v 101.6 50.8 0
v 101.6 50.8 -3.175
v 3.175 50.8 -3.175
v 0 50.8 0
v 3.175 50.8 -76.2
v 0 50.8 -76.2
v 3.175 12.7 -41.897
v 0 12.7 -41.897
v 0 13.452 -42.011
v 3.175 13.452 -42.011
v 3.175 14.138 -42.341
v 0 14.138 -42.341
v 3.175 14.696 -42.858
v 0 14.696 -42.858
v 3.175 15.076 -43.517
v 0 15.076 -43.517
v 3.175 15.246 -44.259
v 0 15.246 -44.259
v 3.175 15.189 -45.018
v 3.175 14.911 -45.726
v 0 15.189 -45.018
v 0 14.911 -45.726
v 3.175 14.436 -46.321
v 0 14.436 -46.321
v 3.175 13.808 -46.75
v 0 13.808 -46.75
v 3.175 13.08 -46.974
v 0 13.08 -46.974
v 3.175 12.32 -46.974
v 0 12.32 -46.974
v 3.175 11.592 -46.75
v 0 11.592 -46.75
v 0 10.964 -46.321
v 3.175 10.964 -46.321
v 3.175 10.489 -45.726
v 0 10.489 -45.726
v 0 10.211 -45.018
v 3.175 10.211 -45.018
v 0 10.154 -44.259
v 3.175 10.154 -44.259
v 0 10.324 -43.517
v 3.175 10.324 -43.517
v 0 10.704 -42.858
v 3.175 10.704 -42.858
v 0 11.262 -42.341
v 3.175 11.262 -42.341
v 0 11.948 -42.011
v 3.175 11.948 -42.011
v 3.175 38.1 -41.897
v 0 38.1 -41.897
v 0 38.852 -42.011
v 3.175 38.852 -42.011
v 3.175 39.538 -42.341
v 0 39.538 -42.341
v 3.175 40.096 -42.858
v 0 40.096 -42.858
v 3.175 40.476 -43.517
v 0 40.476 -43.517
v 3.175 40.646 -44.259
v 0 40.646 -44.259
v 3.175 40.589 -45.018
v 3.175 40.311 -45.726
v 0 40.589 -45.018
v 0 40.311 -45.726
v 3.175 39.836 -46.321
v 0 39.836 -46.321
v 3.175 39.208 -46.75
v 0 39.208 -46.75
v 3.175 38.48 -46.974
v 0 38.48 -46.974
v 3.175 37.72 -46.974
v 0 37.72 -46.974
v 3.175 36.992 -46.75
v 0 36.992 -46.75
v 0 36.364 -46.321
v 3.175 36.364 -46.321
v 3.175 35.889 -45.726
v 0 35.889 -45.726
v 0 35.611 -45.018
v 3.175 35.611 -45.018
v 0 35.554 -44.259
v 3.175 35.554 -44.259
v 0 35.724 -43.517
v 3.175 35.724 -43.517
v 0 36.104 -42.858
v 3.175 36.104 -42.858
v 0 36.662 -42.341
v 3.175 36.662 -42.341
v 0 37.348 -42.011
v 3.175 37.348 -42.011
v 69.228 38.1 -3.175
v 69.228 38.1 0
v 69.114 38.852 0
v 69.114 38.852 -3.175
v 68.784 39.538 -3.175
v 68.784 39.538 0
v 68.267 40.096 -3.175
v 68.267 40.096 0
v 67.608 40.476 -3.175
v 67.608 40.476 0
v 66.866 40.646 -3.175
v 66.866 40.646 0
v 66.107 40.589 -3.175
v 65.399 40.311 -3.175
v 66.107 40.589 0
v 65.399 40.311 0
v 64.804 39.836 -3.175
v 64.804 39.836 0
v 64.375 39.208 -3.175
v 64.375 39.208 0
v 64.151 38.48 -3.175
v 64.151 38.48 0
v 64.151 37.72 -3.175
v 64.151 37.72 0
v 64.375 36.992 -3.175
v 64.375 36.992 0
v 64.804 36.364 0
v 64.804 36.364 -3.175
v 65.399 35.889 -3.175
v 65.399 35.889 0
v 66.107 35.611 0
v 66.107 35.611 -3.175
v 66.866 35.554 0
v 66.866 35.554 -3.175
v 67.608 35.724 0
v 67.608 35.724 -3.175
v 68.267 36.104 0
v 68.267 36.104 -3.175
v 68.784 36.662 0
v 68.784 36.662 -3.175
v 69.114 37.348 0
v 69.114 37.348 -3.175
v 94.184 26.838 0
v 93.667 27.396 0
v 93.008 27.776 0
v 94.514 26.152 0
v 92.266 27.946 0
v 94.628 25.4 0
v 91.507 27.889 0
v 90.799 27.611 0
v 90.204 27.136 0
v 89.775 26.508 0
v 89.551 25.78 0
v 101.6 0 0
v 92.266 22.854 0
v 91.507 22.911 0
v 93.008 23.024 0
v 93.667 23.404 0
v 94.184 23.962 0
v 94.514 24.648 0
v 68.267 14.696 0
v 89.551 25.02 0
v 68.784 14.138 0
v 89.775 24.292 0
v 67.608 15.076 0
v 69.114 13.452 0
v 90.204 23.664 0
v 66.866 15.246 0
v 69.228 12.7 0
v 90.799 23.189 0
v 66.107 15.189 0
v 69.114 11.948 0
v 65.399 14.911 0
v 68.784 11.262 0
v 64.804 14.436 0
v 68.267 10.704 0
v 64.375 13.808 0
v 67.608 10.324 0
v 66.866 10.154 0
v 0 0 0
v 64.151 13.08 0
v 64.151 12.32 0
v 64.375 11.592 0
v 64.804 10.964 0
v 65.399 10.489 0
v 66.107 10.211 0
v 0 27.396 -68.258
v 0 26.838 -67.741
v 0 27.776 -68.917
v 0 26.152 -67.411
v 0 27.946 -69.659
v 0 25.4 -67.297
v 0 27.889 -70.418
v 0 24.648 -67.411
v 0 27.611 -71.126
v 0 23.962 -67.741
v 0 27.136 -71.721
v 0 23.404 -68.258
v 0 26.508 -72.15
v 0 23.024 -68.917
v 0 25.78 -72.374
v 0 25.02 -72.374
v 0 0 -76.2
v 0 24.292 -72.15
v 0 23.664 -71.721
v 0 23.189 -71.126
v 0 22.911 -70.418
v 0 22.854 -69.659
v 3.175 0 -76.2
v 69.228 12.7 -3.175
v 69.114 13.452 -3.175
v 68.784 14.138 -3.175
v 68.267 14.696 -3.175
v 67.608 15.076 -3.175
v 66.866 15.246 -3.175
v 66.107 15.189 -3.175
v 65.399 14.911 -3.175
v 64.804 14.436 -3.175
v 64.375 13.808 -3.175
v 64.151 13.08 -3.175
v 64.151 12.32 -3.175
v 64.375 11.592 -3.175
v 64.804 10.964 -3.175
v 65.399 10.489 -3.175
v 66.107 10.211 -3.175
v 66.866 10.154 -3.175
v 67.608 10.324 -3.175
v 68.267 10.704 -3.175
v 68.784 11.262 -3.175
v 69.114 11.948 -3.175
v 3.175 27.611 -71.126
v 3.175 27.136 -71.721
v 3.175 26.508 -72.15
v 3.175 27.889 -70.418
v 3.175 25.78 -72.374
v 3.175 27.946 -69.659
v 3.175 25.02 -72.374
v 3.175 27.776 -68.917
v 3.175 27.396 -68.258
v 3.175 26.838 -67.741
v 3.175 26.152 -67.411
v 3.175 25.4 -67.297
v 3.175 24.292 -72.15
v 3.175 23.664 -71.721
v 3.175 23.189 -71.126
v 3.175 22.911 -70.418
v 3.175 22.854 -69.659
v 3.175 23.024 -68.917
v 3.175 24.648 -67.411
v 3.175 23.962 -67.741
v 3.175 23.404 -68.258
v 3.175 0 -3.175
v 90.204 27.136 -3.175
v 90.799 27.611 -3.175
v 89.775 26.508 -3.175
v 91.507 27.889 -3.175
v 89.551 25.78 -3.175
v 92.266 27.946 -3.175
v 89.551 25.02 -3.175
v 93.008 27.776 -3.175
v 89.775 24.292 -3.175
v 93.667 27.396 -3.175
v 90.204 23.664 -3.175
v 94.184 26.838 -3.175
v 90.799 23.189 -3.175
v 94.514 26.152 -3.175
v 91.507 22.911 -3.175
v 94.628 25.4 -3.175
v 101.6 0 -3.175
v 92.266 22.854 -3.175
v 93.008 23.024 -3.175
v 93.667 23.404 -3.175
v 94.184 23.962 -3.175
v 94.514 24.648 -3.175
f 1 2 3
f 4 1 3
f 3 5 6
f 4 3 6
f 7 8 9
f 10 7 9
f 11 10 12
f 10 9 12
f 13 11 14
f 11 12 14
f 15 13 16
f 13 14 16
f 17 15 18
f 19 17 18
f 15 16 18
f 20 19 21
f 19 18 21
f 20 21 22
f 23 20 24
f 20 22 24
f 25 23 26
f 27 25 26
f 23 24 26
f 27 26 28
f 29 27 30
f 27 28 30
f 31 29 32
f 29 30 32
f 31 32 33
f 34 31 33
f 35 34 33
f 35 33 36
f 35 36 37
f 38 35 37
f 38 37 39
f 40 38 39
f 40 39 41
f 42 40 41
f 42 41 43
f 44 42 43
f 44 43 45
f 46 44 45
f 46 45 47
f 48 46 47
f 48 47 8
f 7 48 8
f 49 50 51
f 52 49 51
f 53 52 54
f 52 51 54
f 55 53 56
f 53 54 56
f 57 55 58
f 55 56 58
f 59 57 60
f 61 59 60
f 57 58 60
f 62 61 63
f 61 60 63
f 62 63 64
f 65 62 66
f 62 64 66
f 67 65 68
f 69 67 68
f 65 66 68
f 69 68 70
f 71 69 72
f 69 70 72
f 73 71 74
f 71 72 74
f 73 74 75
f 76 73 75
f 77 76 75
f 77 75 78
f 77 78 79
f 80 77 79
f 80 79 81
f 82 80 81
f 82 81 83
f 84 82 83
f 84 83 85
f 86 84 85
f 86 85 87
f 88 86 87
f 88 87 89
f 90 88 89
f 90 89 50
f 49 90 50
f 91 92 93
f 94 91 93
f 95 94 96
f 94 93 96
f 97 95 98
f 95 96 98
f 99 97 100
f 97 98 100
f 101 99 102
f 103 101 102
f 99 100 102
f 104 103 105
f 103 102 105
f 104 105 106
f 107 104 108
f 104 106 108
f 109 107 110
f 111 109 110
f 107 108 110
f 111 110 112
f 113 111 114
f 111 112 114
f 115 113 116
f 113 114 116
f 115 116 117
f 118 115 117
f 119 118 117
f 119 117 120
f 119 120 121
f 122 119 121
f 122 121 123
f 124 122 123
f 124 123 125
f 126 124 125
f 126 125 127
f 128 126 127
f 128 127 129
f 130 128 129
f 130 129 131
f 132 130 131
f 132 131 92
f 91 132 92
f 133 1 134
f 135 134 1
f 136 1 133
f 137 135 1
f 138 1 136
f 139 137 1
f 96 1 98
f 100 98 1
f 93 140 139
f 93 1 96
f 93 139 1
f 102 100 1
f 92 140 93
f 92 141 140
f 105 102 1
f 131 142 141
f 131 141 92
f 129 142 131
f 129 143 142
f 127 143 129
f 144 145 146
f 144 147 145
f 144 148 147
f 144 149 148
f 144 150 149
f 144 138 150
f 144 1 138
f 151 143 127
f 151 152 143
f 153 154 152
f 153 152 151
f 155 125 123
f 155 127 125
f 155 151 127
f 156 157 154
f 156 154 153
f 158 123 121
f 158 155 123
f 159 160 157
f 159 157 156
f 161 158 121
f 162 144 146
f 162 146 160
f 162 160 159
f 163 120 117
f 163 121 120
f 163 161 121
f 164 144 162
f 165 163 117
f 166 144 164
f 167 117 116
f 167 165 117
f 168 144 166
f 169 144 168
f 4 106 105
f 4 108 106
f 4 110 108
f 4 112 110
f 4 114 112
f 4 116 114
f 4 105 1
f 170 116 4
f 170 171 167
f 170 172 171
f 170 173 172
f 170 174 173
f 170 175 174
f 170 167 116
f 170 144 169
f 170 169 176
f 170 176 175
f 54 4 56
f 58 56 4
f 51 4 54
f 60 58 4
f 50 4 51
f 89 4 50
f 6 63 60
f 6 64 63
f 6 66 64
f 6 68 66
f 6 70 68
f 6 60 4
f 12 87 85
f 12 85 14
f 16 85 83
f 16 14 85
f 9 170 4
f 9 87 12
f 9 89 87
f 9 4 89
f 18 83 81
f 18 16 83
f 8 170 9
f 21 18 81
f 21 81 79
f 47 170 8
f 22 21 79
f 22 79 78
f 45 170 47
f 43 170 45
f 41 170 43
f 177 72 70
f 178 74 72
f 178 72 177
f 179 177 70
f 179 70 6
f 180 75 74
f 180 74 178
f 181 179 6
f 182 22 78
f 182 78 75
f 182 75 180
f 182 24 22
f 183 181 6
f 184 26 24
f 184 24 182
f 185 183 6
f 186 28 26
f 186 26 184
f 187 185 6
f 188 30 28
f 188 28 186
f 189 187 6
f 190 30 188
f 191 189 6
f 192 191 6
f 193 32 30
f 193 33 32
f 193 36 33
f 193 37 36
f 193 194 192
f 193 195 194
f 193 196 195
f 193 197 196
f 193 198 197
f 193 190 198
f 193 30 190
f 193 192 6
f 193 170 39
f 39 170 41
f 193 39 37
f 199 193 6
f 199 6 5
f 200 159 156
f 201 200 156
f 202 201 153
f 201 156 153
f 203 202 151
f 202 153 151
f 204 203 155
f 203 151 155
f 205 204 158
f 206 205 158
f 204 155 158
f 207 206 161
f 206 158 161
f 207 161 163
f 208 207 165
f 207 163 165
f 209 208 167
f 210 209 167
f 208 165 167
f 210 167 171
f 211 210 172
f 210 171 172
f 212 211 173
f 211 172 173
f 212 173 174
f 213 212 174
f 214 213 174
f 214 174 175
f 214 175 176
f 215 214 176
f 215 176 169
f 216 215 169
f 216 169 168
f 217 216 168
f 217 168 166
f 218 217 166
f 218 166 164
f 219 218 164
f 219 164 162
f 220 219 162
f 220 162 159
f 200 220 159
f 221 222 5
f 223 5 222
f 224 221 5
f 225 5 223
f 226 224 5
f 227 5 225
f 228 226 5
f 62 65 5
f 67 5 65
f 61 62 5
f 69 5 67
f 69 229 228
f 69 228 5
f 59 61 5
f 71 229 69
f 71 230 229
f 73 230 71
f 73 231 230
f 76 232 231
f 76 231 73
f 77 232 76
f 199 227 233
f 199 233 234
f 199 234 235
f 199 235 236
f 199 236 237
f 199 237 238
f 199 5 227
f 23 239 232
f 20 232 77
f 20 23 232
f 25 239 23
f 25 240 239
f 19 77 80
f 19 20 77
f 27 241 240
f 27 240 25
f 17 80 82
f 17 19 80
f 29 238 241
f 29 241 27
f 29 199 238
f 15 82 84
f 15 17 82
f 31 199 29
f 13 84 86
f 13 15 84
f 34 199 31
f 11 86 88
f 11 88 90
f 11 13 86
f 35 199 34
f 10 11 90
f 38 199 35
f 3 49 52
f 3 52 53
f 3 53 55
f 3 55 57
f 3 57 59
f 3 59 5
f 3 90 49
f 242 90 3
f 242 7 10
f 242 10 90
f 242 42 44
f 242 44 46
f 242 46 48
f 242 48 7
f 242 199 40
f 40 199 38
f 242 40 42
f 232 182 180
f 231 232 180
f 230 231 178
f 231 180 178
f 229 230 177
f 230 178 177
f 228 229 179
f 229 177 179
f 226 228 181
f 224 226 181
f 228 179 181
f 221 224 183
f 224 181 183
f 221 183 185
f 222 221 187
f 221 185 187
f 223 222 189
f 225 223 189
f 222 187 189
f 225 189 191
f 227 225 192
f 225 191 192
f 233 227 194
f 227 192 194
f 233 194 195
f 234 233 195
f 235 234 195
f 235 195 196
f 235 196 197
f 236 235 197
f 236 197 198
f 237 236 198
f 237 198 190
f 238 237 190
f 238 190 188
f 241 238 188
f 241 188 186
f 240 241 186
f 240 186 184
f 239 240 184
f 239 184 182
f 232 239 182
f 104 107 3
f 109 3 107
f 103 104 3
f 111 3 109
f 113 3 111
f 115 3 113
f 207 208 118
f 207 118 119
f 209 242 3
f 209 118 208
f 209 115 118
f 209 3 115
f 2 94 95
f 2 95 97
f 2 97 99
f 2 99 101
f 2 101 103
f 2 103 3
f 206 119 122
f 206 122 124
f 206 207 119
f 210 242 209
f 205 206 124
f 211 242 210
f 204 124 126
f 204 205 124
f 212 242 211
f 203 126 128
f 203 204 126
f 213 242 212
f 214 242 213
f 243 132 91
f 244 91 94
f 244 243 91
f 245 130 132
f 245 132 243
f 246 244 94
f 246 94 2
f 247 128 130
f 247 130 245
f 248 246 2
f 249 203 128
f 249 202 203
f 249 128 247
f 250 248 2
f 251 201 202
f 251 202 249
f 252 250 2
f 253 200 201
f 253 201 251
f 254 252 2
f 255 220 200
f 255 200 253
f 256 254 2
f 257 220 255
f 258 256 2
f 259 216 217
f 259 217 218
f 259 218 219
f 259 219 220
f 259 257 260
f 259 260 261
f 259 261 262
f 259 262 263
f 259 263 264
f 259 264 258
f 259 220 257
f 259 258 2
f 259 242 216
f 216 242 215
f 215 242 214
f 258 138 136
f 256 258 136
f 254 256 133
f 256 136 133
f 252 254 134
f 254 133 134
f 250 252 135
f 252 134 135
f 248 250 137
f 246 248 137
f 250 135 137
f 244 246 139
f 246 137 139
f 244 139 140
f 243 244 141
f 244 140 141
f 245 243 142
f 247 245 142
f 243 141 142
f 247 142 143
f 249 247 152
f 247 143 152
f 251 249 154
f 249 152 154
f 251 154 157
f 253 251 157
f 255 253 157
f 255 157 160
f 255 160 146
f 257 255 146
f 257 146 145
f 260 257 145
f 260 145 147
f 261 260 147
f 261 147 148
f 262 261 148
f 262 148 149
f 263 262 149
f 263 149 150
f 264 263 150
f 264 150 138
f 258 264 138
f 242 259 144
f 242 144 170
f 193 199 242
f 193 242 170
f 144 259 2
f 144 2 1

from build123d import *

# Parameters (mm, degrees)
BOSS_EXTRUDE1_DEPTH = 50.8
SKETCH2_R           = 2.5527
CUT_EXTRUDE1_DEPTH  = 50.8
SKETCH3_R           = 2.5527
CUT_EXTRUDE2_DEPTH  = 50.8


with BuildPart() as part:
    # Sketch1 → Boss-Extrude1 (new body)
    with BuildSketch(Plane(origin=(0, 0, 0), x_dir=(1, 0, 0), z_dir=(0, 1, 0))):
        Polygon((0, 0), (0, 76.2), (3.175, 76.2), (3.175, 3.175), (101.6, 3.175), (101.6, 0), align=None)
    extrude(amount=BOSS_EXTRUDE1_DEPTH)

    # Sketch2 → Cut-Extrude1 (cut)
    with BuildSketch(Plane.XY):
        with Locations((92.075, 25.4)):
            Circle(SKETCH2_R)
        with Locations((66.675, 38.1)):
            Circle(SKETCH2_R)
        with Locations((66.675, 12.7)):
            Circle(SKETCH2_R)
    extrude(amount=-CUT_EXTRUDE1_DEPTH, mode=Mode.SUBTRACT)

    # Sketch3 → Cut-Extrude2 (cut)
    with BuildSketch(Plane.ZY):
        with Locations((-69.85, 25.4)):
            Circle(SKETCH3_R)
        with Locations((-44.45, 38.1)):
            Circle(SKETCH3_R)
        with Locations((-44.45, 12.7)):
            Circle(SKETCH3_R)
    extrude(amount=-CUT_EXTRUDE2_DEPTH, mode=Mode.SUBTRACT)


solid = part.part
